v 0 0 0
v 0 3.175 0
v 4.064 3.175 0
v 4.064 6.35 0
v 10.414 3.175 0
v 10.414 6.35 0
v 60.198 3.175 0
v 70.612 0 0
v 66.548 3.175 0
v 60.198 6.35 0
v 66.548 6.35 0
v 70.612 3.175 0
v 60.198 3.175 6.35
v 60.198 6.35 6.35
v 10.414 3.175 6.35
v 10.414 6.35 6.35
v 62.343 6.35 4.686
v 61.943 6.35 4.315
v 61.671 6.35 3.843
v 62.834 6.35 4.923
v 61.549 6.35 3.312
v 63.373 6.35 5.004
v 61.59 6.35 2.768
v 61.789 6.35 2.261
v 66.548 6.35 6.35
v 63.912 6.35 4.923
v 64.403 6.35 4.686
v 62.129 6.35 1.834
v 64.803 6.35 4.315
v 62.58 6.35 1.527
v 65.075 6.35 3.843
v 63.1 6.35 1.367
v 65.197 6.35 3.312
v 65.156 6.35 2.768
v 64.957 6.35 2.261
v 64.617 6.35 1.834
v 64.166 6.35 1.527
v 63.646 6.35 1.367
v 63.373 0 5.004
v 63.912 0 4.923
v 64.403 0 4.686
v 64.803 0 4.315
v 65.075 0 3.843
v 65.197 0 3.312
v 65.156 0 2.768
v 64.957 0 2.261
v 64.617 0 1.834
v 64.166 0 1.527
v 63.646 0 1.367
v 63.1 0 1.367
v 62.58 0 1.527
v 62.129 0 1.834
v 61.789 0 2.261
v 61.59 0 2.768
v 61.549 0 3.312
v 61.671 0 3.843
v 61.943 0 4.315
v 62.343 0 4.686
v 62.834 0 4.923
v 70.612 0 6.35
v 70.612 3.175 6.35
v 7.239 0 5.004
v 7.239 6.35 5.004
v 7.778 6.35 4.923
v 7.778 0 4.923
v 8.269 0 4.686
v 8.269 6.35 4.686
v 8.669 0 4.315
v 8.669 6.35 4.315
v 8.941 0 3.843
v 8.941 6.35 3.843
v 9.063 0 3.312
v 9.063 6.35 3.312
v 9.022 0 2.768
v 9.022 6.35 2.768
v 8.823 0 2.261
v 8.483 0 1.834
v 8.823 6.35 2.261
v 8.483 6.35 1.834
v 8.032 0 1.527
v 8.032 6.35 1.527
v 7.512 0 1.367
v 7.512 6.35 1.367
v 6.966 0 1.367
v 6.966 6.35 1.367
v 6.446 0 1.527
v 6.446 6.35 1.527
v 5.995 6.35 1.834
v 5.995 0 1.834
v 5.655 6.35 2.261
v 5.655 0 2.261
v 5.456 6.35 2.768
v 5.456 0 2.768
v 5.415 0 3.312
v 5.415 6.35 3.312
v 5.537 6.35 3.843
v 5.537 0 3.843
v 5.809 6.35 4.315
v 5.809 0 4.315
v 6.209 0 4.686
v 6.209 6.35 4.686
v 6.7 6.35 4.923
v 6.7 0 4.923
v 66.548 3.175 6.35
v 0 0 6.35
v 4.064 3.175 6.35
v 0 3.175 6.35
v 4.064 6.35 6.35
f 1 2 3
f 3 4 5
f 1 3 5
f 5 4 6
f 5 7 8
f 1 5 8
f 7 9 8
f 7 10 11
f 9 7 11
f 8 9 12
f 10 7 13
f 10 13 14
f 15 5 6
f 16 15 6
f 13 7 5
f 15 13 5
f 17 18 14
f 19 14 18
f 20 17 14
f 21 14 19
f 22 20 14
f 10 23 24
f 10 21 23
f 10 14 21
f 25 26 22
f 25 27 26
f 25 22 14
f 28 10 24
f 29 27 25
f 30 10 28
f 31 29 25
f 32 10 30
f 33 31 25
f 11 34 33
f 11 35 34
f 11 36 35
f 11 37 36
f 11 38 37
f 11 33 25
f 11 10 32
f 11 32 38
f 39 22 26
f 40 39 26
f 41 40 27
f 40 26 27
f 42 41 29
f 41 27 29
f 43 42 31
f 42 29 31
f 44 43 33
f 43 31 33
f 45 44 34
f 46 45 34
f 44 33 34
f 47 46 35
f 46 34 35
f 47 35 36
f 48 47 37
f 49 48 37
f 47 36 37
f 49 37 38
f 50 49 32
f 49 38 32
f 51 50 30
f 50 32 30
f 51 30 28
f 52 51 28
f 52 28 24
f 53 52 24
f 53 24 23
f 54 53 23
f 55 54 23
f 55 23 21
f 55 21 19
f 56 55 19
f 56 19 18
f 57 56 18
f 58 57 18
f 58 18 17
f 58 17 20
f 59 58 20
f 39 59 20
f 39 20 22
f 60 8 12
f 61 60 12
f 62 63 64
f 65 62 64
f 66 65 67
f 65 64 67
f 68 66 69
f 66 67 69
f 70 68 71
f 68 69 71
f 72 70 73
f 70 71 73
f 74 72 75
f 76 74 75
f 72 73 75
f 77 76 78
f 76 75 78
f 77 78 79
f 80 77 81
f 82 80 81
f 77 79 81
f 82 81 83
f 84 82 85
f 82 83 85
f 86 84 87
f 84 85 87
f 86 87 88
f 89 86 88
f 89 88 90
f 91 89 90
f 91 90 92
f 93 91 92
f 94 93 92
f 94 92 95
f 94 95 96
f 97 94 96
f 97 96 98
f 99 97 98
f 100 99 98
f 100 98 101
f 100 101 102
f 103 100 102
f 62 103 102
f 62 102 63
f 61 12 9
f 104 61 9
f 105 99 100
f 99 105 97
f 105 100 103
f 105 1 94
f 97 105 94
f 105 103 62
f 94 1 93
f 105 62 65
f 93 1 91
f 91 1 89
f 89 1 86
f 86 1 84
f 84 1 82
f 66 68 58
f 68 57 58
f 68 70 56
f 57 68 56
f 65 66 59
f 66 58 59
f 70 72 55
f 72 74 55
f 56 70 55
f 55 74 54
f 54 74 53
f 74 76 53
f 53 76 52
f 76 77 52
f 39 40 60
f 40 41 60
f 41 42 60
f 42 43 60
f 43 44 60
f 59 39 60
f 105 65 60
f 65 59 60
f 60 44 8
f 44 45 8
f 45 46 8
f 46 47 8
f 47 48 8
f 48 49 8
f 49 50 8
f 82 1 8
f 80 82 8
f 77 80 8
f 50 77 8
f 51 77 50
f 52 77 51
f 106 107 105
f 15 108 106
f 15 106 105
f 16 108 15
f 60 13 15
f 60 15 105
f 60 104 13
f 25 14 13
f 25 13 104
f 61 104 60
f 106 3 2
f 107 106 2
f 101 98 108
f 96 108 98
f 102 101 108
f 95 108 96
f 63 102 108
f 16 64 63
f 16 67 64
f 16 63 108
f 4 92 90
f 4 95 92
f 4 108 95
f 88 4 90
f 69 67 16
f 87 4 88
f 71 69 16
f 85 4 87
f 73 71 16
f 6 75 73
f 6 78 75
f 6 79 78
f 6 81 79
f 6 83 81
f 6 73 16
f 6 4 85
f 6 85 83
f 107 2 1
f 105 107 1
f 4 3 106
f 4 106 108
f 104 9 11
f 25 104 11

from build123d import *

# Parameters (mm, degrees)
SKETCH1_W             = 6.35
SKETCH1_H             = 3.175
BOSS_EXTRUDE1_DEPTH   = 6.35
F_6_CLEARANCE_HOLE1_D = 3.6576


with BuildPart() as part:
    # Sketch1 → Boss-Extrude1 (new body)
    with BuildSketch(Plane.XY):
        Polygon((0, 0), (35.306, 0), (35.306, 3.175), (10.414, 3.175), (4.064, 3.175), (0, 3.175), align=None)
        with Locations((7.239, 4.7625)):
            Rectangle(SKETCH1_W, SKETCH1_H)
        with Locations((63.373, 4.7625)):
            Rectangle(SKETCH1_W, SKETCH1_H)
        Polygon((35.306, 3.175), (35.306, 0), (70.612, 0), (70.612, 3.175), (66.548, 3.175), (60.198, 3.175), align=None)
    extrude(amount=BOSS_EXTRUDE1_DEPTH)

    # #6 Clearance Hole1 (through all)
    with Locations(Plane(origin=(7.239, 0, 3.175), x_dir=(0, 0, -1), z_dir=(0, -1, 0))):
        with Locations((0, 0), (0, 56.134)):
            Hole(F_6_CLEARANCE_HOLE1_D / 2)


solid = part.part
